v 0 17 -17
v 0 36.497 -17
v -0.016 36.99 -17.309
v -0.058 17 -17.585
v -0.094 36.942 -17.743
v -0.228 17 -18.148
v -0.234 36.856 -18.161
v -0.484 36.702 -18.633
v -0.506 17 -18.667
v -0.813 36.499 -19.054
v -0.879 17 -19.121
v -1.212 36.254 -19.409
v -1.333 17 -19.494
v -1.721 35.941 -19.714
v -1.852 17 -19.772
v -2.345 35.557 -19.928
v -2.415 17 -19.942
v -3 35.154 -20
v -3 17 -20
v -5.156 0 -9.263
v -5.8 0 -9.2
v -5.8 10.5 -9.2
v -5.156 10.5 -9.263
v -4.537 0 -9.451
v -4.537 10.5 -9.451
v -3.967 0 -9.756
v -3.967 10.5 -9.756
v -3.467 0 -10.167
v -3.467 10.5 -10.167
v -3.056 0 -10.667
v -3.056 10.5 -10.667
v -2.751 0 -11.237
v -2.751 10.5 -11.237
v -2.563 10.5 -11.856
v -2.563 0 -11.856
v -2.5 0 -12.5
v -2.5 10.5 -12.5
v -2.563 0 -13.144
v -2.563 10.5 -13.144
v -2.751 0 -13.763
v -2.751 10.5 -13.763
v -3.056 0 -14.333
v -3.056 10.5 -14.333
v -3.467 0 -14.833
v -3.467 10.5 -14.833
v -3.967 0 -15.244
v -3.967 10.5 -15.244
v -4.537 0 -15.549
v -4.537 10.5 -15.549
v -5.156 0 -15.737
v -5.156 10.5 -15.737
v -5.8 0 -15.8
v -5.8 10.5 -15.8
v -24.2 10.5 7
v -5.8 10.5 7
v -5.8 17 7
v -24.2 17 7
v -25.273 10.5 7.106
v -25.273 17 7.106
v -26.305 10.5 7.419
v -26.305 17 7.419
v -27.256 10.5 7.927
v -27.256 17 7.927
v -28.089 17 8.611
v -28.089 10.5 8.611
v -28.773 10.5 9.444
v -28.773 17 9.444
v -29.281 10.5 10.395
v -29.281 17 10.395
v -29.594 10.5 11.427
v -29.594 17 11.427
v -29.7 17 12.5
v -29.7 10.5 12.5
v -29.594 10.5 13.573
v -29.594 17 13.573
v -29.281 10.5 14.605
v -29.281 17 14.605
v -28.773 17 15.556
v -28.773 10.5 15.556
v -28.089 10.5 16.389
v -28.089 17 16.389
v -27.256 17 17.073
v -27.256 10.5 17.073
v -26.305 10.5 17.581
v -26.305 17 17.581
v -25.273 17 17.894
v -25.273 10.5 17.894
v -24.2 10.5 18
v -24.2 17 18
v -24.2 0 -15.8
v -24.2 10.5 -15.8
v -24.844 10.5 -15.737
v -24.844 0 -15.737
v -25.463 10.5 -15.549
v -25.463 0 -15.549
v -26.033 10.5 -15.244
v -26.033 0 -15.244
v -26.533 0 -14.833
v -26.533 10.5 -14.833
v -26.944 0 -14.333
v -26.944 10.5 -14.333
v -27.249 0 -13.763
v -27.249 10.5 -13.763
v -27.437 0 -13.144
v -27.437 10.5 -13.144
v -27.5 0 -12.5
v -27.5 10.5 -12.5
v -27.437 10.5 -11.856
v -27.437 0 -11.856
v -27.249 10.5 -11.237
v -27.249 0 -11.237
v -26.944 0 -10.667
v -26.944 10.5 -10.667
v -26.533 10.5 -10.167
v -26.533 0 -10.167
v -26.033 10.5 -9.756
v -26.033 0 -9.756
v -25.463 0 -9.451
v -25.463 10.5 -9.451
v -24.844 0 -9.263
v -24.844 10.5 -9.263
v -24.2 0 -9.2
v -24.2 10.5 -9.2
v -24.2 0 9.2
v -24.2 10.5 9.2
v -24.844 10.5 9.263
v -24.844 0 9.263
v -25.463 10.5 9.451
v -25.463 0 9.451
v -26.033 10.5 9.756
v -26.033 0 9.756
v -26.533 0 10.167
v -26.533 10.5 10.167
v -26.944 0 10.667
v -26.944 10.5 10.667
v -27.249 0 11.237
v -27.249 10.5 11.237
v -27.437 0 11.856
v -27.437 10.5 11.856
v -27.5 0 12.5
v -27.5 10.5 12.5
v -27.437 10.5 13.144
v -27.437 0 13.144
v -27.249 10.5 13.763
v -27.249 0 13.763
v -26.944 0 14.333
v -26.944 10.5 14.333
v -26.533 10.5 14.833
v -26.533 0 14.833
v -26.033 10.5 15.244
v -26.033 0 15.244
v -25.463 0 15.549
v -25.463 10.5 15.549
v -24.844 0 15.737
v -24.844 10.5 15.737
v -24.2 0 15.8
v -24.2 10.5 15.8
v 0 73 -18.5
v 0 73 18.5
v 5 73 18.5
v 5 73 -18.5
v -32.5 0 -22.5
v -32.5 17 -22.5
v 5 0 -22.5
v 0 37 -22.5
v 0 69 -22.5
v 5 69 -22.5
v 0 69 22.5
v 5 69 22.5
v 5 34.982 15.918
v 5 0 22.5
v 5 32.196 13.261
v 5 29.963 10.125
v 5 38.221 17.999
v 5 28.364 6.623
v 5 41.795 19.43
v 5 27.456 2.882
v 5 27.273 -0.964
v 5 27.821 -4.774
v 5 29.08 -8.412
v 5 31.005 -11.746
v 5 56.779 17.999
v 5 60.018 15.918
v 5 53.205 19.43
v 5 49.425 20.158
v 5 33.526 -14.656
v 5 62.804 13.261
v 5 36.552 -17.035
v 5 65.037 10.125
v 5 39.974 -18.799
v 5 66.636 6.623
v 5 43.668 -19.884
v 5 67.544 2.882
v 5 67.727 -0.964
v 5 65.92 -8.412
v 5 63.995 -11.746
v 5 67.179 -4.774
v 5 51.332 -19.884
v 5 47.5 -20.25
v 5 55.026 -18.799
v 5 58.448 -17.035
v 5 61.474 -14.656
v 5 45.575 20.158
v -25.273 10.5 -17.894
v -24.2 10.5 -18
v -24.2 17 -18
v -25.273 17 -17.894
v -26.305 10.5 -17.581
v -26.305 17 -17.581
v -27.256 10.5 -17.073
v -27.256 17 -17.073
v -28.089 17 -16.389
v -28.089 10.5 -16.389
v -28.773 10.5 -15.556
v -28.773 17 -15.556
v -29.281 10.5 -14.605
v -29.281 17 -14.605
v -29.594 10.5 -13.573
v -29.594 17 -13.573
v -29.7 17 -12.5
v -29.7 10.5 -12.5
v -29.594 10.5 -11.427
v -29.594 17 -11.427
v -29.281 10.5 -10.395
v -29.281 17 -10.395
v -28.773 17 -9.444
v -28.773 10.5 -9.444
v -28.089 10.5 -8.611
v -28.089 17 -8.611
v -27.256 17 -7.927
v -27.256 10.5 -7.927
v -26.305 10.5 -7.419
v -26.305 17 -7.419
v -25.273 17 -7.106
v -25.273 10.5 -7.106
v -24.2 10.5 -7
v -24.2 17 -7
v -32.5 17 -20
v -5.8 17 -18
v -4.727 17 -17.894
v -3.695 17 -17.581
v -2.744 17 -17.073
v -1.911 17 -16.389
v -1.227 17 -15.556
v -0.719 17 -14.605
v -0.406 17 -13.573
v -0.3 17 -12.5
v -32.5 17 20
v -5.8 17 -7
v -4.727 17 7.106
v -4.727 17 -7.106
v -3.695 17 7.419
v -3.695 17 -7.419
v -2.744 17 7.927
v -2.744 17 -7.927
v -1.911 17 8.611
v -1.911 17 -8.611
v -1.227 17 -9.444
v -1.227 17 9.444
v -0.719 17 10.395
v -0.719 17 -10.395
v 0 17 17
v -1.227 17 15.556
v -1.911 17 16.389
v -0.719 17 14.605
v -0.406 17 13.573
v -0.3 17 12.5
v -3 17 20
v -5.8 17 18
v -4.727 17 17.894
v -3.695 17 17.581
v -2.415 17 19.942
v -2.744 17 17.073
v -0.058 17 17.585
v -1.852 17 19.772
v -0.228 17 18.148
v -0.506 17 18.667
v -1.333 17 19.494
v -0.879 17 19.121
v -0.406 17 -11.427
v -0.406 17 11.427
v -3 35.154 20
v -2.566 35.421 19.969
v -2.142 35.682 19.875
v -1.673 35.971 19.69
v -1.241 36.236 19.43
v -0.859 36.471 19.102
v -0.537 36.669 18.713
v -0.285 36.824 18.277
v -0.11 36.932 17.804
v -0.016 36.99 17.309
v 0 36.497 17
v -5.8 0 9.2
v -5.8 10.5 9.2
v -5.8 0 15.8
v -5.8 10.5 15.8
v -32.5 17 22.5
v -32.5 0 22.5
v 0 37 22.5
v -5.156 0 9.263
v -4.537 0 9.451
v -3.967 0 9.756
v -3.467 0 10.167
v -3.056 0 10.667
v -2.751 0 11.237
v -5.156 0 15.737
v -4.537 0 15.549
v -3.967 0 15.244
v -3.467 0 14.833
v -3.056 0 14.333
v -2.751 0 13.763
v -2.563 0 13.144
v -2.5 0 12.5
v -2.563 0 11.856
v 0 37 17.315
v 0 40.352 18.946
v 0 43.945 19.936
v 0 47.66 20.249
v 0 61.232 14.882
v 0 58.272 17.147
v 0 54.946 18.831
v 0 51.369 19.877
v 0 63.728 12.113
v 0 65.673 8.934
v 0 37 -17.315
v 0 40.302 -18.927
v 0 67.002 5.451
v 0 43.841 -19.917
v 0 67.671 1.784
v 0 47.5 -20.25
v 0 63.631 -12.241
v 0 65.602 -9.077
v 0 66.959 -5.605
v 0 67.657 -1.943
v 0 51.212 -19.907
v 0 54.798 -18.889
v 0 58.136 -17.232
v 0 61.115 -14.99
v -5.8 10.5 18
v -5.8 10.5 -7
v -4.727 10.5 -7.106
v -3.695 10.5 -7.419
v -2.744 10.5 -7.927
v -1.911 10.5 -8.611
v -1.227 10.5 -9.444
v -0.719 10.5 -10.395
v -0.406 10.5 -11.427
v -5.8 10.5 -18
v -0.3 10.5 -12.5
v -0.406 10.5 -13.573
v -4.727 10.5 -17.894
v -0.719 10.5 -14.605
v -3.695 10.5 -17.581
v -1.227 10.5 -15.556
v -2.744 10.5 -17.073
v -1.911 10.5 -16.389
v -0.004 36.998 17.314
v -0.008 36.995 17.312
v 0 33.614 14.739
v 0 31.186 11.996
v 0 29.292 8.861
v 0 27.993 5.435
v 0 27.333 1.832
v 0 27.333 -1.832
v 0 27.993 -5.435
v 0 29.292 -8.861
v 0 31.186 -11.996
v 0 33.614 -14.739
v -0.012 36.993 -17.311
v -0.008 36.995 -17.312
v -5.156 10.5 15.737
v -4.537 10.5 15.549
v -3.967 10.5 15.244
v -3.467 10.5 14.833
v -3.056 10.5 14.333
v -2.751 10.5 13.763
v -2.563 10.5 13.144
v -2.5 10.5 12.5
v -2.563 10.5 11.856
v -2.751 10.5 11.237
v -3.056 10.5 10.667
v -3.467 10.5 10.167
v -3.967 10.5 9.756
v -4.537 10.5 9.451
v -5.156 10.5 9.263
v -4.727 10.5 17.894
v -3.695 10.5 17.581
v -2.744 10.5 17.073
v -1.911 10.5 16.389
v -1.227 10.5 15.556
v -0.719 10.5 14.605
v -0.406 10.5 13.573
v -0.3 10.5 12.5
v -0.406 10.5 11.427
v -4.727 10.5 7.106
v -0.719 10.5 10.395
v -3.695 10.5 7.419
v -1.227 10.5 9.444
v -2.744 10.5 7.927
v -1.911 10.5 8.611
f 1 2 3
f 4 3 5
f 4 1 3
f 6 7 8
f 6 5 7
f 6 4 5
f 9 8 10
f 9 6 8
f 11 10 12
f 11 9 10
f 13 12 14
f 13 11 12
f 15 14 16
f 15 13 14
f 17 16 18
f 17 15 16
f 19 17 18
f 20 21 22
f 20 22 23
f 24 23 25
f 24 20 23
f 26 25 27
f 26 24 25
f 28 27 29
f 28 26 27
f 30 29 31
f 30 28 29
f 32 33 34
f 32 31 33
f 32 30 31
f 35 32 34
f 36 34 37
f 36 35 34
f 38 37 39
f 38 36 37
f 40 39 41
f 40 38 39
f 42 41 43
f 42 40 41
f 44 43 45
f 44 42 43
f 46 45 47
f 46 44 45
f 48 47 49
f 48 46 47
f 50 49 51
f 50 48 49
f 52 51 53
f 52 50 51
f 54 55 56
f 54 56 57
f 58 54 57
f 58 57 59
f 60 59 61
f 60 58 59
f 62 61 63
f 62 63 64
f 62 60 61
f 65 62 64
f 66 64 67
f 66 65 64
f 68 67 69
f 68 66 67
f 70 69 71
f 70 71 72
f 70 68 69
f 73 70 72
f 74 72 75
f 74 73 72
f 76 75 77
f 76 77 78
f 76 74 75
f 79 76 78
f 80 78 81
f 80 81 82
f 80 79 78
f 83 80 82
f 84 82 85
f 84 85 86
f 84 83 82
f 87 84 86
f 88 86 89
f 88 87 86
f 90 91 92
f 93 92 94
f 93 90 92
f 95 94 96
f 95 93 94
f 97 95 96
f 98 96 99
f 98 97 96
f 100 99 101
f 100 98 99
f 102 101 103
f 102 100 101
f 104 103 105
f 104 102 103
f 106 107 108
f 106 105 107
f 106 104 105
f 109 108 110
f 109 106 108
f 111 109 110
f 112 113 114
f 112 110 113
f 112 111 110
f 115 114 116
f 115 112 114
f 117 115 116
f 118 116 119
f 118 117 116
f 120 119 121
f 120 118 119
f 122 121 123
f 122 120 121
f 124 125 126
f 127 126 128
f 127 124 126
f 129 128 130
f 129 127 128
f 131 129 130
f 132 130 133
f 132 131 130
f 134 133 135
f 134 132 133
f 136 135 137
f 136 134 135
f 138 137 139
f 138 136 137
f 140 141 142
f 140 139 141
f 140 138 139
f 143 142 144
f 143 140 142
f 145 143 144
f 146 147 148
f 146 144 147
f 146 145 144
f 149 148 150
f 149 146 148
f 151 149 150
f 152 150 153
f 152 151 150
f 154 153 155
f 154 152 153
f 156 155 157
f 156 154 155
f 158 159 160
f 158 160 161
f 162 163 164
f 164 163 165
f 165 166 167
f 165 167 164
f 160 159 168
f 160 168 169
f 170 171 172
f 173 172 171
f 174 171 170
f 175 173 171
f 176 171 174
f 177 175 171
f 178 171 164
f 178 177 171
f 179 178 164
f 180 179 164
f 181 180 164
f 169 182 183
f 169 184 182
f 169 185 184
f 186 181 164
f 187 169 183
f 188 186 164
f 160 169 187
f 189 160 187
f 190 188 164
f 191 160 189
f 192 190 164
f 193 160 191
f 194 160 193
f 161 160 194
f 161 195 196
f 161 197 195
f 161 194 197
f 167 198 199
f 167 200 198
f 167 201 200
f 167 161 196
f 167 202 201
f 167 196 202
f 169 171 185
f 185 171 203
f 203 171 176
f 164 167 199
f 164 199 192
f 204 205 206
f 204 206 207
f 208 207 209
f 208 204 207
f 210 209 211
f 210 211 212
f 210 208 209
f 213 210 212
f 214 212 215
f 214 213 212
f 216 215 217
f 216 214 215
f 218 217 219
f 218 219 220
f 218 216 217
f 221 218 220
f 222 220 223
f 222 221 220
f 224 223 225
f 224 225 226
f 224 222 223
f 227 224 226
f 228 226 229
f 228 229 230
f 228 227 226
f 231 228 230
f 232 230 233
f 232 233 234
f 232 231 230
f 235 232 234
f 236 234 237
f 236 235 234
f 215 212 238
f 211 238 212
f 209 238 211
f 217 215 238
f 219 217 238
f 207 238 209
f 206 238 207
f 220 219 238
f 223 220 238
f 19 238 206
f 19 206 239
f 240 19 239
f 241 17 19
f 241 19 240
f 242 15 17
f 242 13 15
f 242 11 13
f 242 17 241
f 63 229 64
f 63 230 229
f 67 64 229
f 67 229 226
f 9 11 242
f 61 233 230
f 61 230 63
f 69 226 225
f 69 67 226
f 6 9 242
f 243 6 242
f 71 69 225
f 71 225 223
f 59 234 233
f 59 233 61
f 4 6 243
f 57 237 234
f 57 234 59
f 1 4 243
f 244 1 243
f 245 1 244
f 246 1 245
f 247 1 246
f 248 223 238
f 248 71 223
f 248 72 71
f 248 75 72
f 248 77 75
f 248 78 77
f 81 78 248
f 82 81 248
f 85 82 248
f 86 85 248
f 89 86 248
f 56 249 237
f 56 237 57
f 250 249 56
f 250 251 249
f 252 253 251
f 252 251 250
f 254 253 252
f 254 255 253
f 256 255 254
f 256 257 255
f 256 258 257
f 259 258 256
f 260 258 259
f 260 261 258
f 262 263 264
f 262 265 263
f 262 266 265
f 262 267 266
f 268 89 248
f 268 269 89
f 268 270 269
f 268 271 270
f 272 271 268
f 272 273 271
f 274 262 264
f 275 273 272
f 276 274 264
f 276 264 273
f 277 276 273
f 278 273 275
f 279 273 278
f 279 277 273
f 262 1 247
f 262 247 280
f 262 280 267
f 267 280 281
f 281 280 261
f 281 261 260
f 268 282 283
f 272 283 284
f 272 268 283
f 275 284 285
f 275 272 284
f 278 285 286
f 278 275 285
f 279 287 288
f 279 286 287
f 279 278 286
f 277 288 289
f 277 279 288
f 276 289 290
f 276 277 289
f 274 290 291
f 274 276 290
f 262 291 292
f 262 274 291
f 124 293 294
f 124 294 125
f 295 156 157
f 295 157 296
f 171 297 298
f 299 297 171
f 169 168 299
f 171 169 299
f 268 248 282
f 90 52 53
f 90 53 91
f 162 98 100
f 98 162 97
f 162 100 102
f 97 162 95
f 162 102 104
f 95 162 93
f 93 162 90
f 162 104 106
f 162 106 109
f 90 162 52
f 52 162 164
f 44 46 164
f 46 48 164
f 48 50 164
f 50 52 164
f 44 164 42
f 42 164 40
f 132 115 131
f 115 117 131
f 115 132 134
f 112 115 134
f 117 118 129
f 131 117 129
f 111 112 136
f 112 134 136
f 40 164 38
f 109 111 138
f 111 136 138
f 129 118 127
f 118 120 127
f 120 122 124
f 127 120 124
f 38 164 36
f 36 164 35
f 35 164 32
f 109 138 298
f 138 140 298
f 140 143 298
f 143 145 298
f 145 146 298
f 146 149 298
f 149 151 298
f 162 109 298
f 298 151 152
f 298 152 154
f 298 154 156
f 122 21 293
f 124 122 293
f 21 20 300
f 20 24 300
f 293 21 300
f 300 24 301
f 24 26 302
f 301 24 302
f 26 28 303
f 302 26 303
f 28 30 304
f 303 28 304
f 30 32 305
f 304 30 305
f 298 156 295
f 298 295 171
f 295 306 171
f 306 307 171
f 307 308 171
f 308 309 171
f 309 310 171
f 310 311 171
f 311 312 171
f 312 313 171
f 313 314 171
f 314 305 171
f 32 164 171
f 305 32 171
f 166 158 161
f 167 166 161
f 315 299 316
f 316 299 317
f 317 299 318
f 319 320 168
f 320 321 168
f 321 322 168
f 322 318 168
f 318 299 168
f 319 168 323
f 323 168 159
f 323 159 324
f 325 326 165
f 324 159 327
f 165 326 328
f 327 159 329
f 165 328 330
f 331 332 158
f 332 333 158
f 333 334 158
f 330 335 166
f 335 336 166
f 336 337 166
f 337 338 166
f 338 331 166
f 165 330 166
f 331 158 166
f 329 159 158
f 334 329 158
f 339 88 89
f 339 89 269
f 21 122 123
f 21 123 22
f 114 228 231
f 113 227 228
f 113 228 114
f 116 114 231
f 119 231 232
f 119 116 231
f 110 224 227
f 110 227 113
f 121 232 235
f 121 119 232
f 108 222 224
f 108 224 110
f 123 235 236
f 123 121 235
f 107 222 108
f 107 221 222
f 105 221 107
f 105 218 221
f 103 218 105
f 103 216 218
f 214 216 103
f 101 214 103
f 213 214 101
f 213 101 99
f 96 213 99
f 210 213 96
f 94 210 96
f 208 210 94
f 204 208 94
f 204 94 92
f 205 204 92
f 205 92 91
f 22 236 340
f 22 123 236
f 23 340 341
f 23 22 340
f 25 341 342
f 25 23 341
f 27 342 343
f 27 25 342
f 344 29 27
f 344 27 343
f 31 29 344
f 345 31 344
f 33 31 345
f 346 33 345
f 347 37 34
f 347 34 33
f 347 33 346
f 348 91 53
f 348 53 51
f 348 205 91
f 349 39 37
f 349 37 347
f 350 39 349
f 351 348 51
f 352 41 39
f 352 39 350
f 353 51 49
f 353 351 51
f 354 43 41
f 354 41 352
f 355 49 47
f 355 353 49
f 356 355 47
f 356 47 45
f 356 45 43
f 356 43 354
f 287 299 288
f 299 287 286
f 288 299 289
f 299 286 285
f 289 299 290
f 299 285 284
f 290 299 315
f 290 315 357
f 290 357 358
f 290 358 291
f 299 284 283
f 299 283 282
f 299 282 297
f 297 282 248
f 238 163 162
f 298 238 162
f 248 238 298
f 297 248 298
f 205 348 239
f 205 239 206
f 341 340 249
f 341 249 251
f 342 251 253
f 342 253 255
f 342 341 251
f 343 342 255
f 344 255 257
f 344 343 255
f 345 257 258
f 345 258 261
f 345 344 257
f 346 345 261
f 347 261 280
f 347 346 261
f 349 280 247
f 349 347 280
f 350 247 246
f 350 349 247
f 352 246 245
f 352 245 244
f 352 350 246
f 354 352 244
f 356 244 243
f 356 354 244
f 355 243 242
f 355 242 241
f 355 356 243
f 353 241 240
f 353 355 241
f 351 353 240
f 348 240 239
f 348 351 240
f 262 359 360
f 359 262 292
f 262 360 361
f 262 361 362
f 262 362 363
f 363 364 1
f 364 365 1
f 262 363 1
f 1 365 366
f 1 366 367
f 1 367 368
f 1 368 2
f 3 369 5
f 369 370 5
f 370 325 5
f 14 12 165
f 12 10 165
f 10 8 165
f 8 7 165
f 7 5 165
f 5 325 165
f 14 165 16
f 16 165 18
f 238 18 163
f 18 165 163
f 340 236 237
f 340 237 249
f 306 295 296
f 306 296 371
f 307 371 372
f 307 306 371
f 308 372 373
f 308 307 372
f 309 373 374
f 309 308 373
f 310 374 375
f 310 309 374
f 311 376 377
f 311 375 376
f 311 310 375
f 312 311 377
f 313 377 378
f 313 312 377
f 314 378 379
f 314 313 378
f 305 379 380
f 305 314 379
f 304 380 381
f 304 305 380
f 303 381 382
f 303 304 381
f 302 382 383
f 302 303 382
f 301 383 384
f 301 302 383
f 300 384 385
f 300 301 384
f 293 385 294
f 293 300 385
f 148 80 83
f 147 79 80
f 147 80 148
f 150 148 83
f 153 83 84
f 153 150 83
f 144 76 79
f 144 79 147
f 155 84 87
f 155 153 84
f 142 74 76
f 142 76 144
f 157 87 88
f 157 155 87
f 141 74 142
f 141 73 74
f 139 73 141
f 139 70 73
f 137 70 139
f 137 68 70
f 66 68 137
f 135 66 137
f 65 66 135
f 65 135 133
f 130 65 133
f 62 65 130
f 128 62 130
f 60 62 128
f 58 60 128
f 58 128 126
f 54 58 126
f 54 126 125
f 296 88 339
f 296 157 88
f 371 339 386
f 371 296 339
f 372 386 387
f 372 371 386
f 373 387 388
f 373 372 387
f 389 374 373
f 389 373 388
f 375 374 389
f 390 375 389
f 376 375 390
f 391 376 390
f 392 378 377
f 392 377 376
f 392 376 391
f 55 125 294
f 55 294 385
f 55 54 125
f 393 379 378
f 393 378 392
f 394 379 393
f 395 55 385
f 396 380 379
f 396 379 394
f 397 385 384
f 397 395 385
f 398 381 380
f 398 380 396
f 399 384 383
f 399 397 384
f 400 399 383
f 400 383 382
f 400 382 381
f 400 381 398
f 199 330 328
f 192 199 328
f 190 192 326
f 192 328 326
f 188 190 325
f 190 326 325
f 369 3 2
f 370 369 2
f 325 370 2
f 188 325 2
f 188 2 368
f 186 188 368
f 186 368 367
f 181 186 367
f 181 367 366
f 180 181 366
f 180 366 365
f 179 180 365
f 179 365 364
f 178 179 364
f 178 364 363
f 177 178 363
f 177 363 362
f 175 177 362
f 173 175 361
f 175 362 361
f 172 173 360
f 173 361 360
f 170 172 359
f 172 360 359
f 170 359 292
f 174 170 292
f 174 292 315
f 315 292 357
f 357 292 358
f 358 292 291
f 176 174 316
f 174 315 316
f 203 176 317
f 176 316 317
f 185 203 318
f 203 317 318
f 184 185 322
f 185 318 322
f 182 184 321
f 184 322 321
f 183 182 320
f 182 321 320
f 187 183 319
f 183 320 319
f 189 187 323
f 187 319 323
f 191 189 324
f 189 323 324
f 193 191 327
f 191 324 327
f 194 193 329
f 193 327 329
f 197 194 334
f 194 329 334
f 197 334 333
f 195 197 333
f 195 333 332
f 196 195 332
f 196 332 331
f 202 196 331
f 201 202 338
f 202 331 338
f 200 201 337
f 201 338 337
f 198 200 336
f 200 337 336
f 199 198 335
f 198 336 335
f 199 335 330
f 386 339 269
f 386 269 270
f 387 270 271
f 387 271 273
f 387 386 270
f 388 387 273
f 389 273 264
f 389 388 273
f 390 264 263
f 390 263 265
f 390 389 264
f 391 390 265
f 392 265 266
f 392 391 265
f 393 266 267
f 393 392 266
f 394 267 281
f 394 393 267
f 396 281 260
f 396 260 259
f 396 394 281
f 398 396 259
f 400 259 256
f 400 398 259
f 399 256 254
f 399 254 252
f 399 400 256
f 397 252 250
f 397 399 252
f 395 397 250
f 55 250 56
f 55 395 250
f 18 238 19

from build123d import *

# Parameters (mm, degrees)
SKETCH1_W                                      = 45
SKETCH1_H                                      = 73
SKETCH1_R                                      = 20.25
BOSS_EXTRUDE1_DEPTH                            = 5
CHAMFER1_SIZE                                  = 4
SKETCH2_W                                      = 45
SKETCH2_H                                      = 17
BOSS_EXTRUDE2_DEPTH                            = 32.5
CBORE_SLOT_FOR_M6_HEX_SOCKET_HEAD_CAP_SC_DEPTH = 17
CBORE_START                                    = 10.5
CBORE_SLOT_FOR_M6_HEX_SOCKET_HEAD_CA_3_DEPTH   = 6.5
BOSS_EXTRUDE3_DEPTH                            = 2.5
FILLET1_R                                      = 3
FILLET1_OF_MIRROR1_R                           = 3


# Read off the part's stored shape, not the designer's step: CBORE SLOT for M6 Hex Socket Head Cap Screw1
with BuildPart() as part:
    # Sketch1 → Boss-Extrude1 (new body)
    with BuildSketch(Plane(origin=(0, 0, 0), x_dir=(0, 0, -1), z_dir=(1, 0, 0))):
        with Locations((0, 36.5)):
            Rectangle(SKETCH1_W, SKETCH1_H)
        with Locations((0, 47.5)):
            Circle(SKETCH1_R, mode=Mode.SUBTRACT)
    extrude(amount=BOSS_EXTRUDE1_DEPTH)

    # Chamfer1
    chamfer1_edges = [part.edges().sort_by_distance(p)[0] for p in [
        (2.5, 73, 22.5),
        (2.5, 73, -22.5),
    ]]
    chamfer(chamfer1_edges, length=CHAMFER1_SIZE)

    # Sketch2 → Boss-Extrude2 (add)
    with BuildSketch(Plane.ZY):
        with Locations((0, 8.5)):
            Rectangle(SKETCH2_W, SKETCH2_H)
    extrude(amount=BOSS_EXTRUDE2_DEPTH)

    # CBORE SLOT for M6 Hex Socket Head Ca 2 → CBORE SLOT for M6 Hex Socket Head Cap Screw1 (cut)
    with BuildSketch(Plane(origin=(0, 0, 0), x_dir=(1, 0, 0), z_dir=(0, 1, 0))):
        with BuildLine():
            Line((-24.2, -15.8), (-5.8, -15.8))
            ThreePointArc((-5.8, -15.8), (-2.5, -12.5), (-5.8, -9.2))
            Line((-5.8, -9.2), (-24.2, -9.2))
            ThreePointArc((-24.2, -9.2), (-27.5, -12.5), (-24.2, -15.8))
        make_face()
        with BuildLine():
            Line((-24.2, 9.2), (-5.8, 9.2))
            ThreePointArc((-5.8, 9.2), (-2.5, 12.5), (-5.8, 15.8))
            Line((-5.8, 15.8), (-24.2, 15.8))
            ThreePointArc((-24.2, 15.8), (-27.5, 12.5), (-24.2, 9.2))
        make_face()
    extrude(amount=CBORE_SLOT_FOR_M6_HEX_SOCKET_HEAD_CAP_SC_DEPTH, mode=Mode.SUBTRACT)

    # CBORE SLOT for M6 Hex Socket Head Ca 3 o → CBORE SLOT for M6 Hex Socket Head Ca 3 (cut)
    # profile 1 of 2: a face of its own
    with BuildSketch(Plane(origin=(0, 0, 0), x_dir=(1, 0, 0), z_dir=(0, 1, 0)).offset(CBORE_START)):
        with BuildLine():
            Line((-24.2, -18), (-5.8, -18))
            ThreePointArc((-5.8, -18), (-0.3, -12.5), (-5.8, -7))
            Line((-5.8, -7), (-24.2, -7))
            ThreePointArc((-24.2, -7), (-29.7, -12.5), (-24.2, -18))
        make_face()
        with BuildLine():
            ThreePointArc((-5.8, -9.2), (-2.5, -12.5), (-5.8, -15.8))
            Line((-5.8, -15.8), (-24.2, -15.8))
            ThreePointArc((-24.2, -15.8), (-27.5, -12.5), (-24.2, -9.2))
            Line((-24.2, -9.2), (-5.8, -9.2))
        make_face(mode=Mode.SUBTRACT)
    # profile 2 of 2: a face of its own
    with BuildSketch(Plane(origin=(0, 0, 0), x_dir=(1, 0, 0), z_dir=(0, 1, 0)).offset(CBORE_START)):
        with BuildLine():
            Line((-24.2, 7), (-5.8, 7))
            ThreePointArc((-5.8, 7), (-0.3, 12.5), (-5.8, 18))
            Line((-5.8, 18), (-24.2, 18))
            ThreePointArc((-24.2, 18), (-29.7, 12.5), (-24.2, 7))
        make_face()
        with BuildLine():
            ThreePointArc((-5.8, 15.8), (-2.5, 12.5), (-5.8, 9.2))
            Line((-5.8, 9.2), (-24.2, 9.2))
            ThreePointArc((-24.2, 9.2), (-27.5, 12.5), (-24.2, 15.8))
            Line((-24.2, 15.8), (-5.8, 15.8))
        make_face(mode=Mode.SUBTRACT)
    extrude(amount=CBORE_SLOT_FOR_M6_HEX_SOCKET_HEAD_CA_3_DEPTH, mode=Mode.SUBTRACT)

    # Sketch5 → Boss-Extrude3 (add)
    with BuildSketch(Plane.XY.offset(22.5)):
        Polygon((0, 37), (-32.5, 17), (0, 17), align=None)
    boss_extrude3 = extrude(amount=-BOSS_EXTRUDE3_DEPTH)

    # Fillet1
    # the kernel refuses this fillet: 3 mm, written as the material it adds along each edge
    with BuildSketch(Plane(origin=(0, 9.5, 20), x_dir=(0, 0, -1), z_dir=(0, 1, 0))) as fillet1_piece_1_section:
        with BuildLine():
            CenterArc((FILLET1_R, FILLET1_R), FILLET1_R, 180, 90)
            Line((0, FILLET1_R), (0, 0))
            Line((0, 0), (FILLET1_R, 0))
        make_face()
    fillet1_piece_1 = extrude(amount=35, mode=Mode.PRIVATE)
    fillet1_piece_1 = split(fillet1_piece_1, bisect_by=Plane(origin=(-11.093486365, 30.17323916, 19.320814657), z_dir=(0.5240974256643348, -0.8516583167045438, 0)), keep=Keep.TOP, mode=Mode.PRIVATE)
    fillet1_piece_1 = fillet1_piece_1 - Plane(origin=(-0.679185343, 47.5, 0), x_dir=(0, 0, -1), z_dir=(-1, 0, 0)) * Cylinder(20.25, 83, mode=Mode.PRIVATE)
    add(fillet1_piece_1)

    # Mirror1: Boss-Extrude3 across plane
    add(boss_extrude3.mirror(Plane.XY))

    # Fillet1 of Mirror1
    # the kernel refuses this fillet: 3 mm, written as the material it adds along each edge
    with BuildSketch(Plane(origin=(0, 9.5, -20), x_dir=(0, 0, 1), z_dir=(0, 1, 0))) as fillet1_of_mirror1_piece_1_section:
        with BuildLine():
            CenterArc((FILLET1_OF_MIRROR1_R, -FILLET1_OF_MIRROR1_R), FILLET1_OF_MIRROR1_R, 90, 90)
            Line((0, -FILLET1_OF_MIRROR1_R), (0, 0))
            Line((0, 0), (FILLET1_OF_MIRROR1_R, 0))
        make_face()
    fillet1_of_mirror1_piece_1 = extrude(amount=35, mode=Mode.PRIVATE)
    fillet1_of_mirror1_piece_1 = fillet1_of_mirror1_piece_1 - Plane(origin=(-0.679185343, 47.5, 0), x_dir=(0, 0, -1), z_dir=(-1, 0, 0)) * Cylinder(20.25, 83, mode=Mode.PRIVATE)
    fillet1_of_mirror1_piece_1 = split(fillet1_of_mirror1_piece_1, bisect_by=Plane(origin=(-11.093486365, 30.17323916, -19.320814657), z_dir=(0.5240974256643348, -0.8516583167045438, 0)), keep=Keep.TOP, mode=Mode.PRIVATE)
    add(fillet1_of_mirror1_piece_1)


solid = part.part
